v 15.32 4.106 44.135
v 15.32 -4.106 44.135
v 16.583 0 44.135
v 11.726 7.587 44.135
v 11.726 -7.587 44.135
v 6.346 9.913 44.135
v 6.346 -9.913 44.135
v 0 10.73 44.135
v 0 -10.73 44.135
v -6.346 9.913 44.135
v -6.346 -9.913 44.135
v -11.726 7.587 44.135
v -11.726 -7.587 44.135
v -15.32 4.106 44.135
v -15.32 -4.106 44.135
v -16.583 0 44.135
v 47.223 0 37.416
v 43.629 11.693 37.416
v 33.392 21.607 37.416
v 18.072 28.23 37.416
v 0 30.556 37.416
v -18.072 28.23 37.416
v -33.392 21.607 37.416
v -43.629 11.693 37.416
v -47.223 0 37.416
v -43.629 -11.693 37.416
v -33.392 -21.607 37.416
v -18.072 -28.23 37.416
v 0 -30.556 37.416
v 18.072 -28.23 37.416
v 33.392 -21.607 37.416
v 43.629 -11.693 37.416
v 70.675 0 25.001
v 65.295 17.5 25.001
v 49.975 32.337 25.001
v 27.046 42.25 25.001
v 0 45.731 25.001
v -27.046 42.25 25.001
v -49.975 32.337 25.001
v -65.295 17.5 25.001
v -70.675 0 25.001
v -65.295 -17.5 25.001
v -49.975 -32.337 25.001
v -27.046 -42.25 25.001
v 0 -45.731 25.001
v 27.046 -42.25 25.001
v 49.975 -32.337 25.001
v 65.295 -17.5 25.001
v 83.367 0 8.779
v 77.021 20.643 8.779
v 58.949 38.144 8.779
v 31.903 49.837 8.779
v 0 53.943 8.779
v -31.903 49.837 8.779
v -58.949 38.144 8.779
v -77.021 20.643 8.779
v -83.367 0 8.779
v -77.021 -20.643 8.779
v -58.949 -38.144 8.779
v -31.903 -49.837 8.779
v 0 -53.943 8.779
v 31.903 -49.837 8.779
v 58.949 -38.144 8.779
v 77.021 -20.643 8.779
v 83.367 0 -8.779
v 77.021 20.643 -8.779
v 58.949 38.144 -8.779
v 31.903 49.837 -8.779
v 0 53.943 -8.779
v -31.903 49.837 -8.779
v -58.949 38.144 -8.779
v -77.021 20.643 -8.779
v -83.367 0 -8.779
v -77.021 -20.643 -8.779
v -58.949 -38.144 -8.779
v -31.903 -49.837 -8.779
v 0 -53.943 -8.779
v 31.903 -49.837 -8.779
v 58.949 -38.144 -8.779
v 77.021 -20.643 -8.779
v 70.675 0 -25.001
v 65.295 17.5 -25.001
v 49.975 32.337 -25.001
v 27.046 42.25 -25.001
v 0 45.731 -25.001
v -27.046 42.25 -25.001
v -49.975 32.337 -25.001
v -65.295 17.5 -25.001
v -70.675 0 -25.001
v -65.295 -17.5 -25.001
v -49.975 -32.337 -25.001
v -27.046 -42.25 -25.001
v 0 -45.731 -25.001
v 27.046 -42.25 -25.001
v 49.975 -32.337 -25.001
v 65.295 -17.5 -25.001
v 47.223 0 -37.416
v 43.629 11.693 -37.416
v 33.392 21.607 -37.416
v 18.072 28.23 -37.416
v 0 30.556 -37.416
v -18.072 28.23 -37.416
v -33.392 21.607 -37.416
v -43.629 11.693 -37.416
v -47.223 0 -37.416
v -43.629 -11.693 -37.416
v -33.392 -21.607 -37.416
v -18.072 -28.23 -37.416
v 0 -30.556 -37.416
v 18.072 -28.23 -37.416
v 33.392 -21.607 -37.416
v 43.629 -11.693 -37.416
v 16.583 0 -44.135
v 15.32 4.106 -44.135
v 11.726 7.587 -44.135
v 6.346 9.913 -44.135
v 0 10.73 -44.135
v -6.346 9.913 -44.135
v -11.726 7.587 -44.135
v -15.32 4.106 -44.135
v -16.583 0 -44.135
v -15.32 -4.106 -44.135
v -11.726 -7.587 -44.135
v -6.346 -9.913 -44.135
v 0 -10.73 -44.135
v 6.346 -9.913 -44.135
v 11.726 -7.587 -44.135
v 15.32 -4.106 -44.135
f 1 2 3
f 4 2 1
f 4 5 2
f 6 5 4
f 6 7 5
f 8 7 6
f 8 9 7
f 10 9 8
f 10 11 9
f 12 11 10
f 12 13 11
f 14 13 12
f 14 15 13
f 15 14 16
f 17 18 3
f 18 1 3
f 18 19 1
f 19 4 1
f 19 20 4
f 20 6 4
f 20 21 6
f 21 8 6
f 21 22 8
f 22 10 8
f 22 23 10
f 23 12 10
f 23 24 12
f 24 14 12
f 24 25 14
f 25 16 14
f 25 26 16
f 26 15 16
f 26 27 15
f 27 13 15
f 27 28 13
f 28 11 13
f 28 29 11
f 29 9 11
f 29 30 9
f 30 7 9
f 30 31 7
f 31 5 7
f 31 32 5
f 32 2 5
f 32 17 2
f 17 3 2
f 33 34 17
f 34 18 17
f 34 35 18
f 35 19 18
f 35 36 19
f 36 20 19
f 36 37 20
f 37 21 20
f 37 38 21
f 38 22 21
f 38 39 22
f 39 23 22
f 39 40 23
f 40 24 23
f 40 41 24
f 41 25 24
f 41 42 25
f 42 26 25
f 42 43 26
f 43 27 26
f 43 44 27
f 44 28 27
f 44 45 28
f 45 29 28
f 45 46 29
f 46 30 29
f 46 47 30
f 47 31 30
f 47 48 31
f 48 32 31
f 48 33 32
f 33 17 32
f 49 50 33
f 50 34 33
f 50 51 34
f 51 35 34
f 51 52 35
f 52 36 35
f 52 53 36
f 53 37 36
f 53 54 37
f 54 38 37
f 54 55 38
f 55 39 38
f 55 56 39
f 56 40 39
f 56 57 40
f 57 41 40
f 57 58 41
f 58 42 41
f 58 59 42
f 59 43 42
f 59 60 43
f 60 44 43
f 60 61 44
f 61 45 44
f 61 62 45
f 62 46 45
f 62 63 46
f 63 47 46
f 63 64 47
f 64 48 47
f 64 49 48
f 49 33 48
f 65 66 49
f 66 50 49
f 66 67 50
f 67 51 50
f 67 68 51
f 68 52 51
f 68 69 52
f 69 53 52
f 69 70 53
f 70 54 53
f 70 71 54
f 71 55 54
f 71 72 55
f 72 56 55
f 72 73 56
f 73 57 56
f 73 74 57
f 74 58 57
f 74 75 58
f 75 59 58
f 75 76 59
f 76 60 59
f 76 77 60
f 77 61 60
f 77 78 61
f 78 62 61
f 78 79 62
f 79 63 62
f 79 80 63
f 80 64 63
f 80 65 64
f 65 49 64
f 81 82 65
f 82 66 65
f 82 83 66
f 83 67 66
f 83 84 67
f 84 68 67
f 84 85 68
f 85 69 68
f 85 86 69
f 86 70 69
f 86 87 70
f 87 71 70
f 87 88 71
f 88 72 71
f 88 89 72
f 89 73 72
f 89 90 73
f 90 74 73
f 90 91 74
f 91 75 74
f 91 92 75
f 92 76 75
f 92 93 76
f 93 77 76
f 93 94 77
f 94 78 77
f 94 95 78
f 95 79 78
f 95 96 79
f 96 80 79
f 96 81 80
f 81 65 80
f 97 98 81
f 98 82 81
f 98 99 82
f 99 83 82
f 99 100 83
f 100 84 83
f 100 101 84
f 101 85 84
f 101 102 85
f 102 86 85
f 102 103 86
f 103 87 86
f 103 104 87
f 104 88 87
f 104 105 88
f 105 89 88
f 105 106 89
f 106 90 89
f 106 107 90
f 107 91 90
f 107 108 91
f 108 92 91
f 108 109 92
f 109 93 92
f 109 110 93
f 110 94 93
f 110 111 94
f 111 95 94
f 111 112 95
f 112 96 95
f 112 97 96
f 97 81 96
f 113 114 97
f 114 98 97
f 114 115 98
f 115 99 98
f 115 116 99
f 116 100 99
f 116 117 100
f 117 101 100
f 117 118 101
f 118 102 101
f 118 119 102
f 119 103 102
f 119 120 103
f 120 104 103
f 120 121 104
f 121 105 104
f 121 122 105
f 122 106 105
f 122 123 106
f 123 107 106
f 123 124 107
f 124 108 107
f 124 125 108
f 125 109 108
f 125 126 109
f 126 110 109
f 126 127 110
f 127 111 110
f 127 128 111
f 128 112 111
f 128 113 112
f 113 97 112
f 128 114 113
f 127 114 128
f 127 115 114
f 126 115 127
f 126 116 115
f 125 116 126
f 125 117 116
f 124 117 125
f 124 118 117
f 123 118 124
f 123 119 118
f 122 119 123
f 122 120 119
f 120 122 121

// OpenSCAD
// Generated by SolidPython 1.0.1 on 2020-07-29 00:46:53


scale(v = [17, 11, 9]) {
	sphere(r = 5);
}
/***********************************************
*********      SolidPython code:      **********
************************************************
 
# import packages: SolidPython
from solid import *
from solid.utils import *
from itertools import chain, combinations, permutations


class Resize:

    def __init__(self, scad_file):
        self.scad_file = scad_file
        #self.scad_file = import_scad(scad_file)
        # cone/cylinder param:
        self.r1 = 0
        self.r2 = 0
        self.h = 0
        # rectangular prism param:
        self.w = 0
        self.l = 0
        # ellipse param:
        self.r = 0

    # import OpenScad code (file name corresponds to shape)


    # classify shape + parameters
    def assign(self, param1, param2, param3):
        if self.scad_file == 'cone.scad':
            self.r1 = param1
            self.r2 = param2
            self.h = param3
        elif self.scad_file == 'cylinder.scad':
            self.r1 = param1
            self.r2 = param2
            self.h = param3
        elif self.scad_file == 'rectangularPrism.scad':
            self.h = param1
            self.l = param2
            self.w = param3
        else:
            self.r = param1
            self.h = param2

    # resize parameters
    def iterate(self):
        x = range(3, 20, 2)
        i = 1
        if self.scad_file == 'cone.scad':
            tempList = list(permutations(x, 2))
            for temp in tempList:
                param1 = temp[0]
                param2 = temp[1]
                filepath = 'produced_scad_files/' + 'cone' + str(param1) + '_' + str(param2) + '_' + '.scad'
                scad_render_to_file(cylinder(h=param1, r1=param2, r2=0), filepath)

        elif self.scad_file == 'cylinder.scad':
            tempList = list(permutations(x, 3))
            for temp in tempList:
                param1 = temp[0]
                param2 = temp[1]
                filepath = 'produced_scad_files/' + 'cylinder' + str(param1) + '_' + str(param2) + '_' + '.scad'
                scad_render_to_file(cylinder(h=param1, r1=param2, r2=param2), filepath)

        elif self.scad_file == 'rectangularPrism.scad':
            tempList = list(permutations(x, 3))
            for temp in tempList:
                param1 = temp[0]
                param2 = temp[1]
                param3 = temp[2]
                filepath = 'produced_scad_files/' + 'rectangularPrism' + str(param1) + '_' + str(param2) + '_' + str(
                    param3) + '.scad'
                scad_render_to_file(cube(size=(param1, param2, param3)), filepath)

        elif self.scad_file == 'ellipse.scad':
            tempList = list(permutations(x, 4))
            for temp in tempList:
                param1 = temp[0]
                param2 = temp[1]
                param3 = temp[2]
                param4 = temp[3]
                filepath = 'produced_scad_files/' + 'ellipse' + str(param1) + '_' + str(param2) + '_' + str(param3) + '_' + str(param4) + '.scad'
                scad_render_to_file(scale([param1, param2, param3])(sphere(r=param4)), filepath)

    def render_to_scadfile(self):
        scad_render_to_file(scad, 'example.scad') 
 
************************************************/
